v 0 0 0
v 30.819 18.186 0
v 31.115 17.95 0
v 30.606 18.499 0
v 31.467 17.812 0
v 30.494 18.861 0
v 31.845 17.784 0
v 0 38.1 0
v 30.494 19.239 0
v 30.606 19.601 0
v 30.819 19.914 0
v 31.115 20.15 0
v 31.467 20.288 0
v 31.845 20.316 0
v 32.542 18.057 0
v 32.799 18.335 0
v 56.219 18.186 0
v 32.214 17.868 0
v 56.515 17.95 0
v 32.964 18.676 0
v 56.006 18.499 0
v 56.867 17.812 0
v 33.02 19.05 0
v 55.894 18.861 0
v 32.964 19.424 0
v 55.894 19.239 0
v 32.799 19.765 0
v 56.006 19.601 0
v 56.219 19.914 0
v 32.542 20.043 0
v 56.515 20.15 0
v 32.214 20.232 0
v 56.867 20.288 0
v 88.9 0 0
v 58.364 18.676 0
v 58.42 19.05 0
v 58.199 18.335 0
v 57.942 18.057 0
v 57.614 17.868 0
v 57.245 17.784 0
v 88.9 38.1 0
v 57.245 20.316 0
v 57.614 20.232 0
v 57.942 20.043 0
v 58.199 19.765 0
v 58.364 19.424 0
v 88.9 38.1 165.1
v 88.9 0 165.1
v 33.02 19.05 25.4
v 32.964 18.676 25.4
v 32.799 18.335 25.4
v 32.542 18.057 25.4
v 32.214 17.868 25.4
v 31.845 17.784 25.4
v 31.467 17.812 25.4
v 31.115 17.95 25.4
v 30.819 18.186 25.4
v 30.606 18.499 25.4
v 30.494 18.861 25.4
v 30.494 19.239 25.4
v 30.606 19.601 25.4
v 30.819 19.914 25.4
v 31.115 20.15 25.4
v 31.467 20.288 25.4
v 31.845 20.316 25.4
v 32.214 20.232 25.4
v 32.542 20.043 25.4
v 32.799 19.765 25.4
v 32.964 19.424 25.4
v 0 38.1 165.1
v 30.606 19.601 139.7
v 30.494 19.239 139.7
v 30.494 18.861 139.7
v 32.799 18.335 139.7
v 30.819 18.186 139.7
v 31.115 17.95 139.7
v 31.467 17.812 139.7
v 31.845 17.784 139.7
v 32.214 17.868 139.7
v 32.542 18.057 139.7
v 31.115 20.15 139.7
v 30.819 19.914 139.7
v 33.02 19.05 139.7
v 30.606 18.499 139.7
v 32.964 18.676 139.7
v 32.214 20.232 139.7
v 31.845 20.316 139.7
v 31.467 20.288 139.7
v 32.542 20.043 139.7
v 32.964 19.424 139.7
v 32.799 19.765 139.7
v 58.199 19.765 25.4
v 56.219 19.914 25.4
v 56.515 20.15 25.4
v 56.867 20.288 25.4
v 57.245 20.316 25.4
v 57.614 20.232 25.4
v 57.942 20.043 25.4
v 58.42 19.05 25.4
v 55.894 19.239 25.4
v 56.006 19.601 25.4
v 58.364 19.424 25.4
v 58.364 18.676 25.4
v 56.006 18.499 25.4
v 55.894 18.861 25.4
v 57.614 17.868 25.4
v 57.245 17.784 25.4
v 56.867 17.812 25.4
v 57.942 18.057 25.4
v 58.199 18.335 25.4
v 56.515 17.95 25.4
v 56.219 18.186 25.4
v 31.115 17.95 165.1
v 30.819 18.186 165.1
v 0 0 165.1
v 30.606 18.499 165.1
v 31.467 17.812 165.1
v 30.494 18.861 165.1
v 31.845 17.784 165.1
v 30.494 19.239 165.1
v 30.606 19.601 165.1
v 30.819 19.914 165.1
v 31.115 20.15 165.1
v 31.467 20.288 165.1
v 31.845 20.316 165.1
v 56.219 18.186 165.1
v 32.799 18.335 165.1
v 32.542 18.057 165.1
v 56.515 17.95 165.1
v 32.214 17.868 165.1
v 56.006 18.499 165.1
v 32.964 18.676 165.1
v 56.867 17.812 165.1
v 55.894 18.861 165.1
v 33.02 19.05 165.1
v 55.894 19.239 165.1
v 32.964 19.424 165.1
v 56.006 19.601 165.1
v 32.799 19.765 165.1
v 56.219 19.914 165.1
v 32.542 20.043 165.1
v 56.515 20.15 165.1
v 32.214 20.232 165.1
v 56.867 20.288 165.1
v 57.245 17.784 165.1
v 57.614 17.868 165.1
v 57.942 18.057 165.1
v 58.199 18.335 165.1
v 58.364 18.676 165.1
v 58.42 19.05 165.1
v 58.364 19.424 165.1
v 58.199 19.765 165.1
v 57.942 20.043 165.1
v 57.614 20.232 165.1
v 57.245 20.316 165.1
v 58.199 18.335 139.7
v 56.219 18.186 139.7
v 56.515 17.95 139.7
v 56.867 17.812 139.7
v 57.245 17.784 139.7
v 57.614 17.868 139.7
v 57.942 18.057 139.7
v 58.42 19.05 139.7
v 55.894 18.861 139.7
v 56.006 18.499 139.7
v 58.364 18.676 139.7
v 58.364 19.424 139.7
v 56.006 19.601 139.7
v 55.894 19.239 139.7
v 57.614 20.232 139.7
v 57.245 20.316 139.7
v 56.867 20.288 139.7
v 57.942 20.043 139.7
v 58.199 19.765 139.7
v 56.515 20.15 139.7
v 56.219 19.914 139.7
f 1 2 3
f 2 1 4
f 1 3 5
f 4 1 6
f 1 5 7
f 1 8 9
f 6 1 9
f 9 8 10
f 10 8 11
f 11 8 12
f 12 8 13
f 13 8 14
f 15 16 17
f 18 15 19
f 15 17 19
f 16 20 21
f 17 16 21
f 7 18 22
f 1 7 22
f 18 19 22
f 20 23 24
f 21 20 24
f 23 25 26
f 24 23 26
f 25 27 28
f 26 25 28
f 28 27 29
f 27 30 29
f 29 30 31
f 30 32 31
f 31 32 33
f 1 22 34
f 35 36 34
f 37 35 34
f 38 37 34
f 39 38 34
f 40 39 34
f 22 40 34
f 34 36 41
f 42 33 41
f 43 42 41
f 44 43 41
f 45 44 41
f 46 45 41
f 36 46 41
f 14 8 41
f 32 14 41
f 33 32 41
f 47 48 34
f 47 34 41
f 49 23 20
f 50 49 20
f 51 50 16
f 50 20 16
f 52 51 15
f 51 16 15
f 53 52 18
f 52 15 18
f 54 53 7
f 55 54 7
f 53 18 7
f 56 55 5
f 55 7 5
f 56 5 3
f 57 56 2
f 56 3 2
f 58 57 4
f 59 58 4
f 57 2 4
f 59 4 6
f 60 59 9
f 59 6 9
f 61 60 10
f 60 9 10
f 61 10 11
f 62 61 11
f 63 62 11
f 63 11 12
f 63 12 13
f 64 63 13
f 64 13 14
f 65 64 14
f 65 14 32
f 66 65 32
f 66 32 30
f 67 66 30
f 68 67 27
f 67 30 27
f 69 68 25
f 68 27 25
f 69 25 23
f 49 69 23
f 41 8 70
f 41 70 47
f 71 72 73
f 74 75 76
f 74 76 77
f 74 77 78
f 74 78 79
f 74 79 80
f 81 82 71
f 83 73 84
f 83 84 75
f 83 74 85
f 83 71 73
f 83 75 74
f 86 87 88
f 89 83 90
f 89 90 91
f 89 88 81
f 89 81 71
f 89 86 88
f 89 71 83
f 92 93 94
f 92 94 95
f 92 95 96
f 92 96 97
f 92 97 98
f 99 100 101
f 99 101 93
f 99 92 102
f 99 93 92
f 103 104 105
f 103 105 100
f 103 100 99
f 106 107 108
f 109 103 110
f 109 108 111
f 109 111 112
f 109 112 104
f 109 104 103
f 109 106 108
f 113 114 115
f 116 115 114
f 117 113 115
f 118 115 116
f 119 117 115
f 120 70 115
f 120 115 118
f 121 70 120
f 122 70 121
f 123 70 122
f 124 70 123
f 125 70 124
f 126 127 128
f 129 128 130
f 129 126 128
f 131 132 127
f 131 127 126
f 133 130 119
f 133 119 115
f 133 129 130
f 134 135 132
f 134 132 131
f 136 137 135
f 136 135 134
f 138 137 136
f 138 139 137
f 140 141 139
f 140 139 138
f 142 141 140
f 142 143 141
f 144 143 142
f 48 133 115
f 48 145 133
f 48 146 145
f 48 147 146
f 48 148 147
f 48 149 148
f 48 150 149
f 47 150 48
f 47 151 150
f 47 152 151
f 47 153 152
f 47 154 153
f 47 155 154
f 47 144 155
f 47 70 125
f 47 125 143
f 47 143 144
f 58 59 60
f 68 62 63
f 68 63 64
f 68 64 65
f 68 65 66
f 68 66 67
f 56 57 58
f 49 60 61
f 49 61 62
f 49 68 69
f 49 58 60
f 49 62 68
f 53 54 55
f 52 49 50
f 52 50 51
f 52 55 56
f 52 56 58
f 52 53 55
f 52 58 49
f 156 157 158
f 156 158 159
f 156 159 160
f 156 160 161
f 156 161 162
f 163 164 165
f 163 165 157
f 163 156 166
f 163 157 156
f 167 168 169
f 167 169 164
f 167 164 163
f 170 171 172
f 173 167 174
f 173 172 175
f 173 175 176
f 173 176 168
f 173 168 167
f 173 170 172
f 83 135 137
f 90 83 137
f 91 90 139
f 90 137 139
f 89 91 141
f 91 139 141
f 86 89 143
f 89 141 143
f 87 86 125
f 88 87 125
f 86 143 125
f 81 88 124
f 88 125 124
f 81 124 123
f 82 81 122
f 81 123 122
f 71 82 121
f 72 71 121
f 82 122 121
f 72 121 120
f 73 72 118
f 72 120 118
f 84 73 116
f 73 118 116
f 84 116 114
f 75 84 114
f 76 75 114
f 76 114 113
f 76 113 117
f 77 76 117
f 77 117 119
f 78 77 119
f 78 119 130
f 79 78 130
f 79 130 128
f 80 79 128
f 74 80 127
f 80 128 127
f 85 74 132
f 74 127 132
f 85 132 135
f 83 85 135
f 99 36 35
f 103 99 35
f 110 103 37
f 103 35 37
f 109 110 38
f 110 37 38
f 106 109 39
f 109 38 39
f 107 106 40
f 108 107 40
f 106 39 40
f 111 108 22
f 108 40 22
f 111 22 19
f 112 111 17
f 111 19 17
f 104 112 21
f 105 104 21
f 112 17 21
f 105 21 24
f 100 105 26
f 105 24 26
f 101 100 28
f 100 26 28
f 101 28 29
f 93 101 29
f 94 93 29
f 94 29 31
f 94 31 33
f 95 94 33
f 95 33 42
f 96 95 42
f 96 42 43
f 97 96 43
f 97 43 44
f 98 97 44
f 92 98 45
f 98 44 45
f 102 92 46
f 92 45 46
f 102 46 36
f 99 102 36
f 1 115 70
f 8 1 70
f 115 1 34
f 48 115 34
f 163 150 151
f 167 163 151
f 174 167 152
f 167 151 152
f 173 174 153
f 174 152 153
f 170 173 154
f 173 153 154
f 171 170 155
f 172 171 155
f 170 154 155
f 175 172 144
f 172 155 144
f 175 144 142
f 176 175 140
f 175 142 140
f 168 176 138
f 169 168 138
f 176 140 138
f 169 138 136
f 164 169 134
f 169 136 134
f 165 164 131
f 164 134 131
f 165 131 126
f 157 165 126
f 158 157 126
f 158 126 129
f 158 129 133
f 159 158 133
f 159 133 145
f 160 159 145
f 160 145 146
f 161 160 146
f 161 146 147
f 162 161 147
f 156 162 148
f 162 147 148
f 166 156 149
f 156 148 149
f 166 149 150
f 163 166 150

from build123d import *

# Parameters (mm, degrees)
SKETCH002_R      = 1.27
EXTRUDE002_DEPTH = 25.4
SKETCH001_R      = 1.27
EXTRUDE001_DEPTH = 25.4
SKETCH_W         = 88.9
SKETCH_H         = 38.1
EXTRUDE_DEPTH    = 165.1


with BuildPart() as extrude002:
    # Sketch002 → Extrude002 (new body)
    with BuildSketch(Plane(origin=(0, 0, 0), x_dir=(1, 0, 0), z_dir=(0, 0, -1))):
        with Locations((31.75, -19.05)):
            Circle(SKETCH002_R)
        with Locations((57.15, -19.05)):
            Circle(SKETCH002_R)
    extrude(amount=-EXTRUDE002_DEPTH)


with BuildPart() as extrude001:
    # Sketch001 → Extrude001 (new body)
    with BuildSketch(Plane.XY.offset(165.1)):
        with Locations((31.75, 19.05)):
            Circle(SKETCH001_R)
        with Locations((57.15, 19.05)):
            Circle(SKETCH001_R)
    extrude(amount=-EXTRUDE001_DEPTH)


with BuildPart() as cut001:
    # Sketch → Extrude (new body)
    with BuildSketch(Plane.XY):
        with Locations((44.45, 19.05)):
            Rectangle(SKETCH_W, SKETCH_H)
    extrude(amount=EXTRUDE_DEPTH)

    # Cut: cut Extrude001
    add(extrude001.part, mode=Mode.SUBTRACT)

    # Cut001: cut Extrude002
    add(extrude002.part, mode=Mode.SUBTRACT)


solid = cut001.part
